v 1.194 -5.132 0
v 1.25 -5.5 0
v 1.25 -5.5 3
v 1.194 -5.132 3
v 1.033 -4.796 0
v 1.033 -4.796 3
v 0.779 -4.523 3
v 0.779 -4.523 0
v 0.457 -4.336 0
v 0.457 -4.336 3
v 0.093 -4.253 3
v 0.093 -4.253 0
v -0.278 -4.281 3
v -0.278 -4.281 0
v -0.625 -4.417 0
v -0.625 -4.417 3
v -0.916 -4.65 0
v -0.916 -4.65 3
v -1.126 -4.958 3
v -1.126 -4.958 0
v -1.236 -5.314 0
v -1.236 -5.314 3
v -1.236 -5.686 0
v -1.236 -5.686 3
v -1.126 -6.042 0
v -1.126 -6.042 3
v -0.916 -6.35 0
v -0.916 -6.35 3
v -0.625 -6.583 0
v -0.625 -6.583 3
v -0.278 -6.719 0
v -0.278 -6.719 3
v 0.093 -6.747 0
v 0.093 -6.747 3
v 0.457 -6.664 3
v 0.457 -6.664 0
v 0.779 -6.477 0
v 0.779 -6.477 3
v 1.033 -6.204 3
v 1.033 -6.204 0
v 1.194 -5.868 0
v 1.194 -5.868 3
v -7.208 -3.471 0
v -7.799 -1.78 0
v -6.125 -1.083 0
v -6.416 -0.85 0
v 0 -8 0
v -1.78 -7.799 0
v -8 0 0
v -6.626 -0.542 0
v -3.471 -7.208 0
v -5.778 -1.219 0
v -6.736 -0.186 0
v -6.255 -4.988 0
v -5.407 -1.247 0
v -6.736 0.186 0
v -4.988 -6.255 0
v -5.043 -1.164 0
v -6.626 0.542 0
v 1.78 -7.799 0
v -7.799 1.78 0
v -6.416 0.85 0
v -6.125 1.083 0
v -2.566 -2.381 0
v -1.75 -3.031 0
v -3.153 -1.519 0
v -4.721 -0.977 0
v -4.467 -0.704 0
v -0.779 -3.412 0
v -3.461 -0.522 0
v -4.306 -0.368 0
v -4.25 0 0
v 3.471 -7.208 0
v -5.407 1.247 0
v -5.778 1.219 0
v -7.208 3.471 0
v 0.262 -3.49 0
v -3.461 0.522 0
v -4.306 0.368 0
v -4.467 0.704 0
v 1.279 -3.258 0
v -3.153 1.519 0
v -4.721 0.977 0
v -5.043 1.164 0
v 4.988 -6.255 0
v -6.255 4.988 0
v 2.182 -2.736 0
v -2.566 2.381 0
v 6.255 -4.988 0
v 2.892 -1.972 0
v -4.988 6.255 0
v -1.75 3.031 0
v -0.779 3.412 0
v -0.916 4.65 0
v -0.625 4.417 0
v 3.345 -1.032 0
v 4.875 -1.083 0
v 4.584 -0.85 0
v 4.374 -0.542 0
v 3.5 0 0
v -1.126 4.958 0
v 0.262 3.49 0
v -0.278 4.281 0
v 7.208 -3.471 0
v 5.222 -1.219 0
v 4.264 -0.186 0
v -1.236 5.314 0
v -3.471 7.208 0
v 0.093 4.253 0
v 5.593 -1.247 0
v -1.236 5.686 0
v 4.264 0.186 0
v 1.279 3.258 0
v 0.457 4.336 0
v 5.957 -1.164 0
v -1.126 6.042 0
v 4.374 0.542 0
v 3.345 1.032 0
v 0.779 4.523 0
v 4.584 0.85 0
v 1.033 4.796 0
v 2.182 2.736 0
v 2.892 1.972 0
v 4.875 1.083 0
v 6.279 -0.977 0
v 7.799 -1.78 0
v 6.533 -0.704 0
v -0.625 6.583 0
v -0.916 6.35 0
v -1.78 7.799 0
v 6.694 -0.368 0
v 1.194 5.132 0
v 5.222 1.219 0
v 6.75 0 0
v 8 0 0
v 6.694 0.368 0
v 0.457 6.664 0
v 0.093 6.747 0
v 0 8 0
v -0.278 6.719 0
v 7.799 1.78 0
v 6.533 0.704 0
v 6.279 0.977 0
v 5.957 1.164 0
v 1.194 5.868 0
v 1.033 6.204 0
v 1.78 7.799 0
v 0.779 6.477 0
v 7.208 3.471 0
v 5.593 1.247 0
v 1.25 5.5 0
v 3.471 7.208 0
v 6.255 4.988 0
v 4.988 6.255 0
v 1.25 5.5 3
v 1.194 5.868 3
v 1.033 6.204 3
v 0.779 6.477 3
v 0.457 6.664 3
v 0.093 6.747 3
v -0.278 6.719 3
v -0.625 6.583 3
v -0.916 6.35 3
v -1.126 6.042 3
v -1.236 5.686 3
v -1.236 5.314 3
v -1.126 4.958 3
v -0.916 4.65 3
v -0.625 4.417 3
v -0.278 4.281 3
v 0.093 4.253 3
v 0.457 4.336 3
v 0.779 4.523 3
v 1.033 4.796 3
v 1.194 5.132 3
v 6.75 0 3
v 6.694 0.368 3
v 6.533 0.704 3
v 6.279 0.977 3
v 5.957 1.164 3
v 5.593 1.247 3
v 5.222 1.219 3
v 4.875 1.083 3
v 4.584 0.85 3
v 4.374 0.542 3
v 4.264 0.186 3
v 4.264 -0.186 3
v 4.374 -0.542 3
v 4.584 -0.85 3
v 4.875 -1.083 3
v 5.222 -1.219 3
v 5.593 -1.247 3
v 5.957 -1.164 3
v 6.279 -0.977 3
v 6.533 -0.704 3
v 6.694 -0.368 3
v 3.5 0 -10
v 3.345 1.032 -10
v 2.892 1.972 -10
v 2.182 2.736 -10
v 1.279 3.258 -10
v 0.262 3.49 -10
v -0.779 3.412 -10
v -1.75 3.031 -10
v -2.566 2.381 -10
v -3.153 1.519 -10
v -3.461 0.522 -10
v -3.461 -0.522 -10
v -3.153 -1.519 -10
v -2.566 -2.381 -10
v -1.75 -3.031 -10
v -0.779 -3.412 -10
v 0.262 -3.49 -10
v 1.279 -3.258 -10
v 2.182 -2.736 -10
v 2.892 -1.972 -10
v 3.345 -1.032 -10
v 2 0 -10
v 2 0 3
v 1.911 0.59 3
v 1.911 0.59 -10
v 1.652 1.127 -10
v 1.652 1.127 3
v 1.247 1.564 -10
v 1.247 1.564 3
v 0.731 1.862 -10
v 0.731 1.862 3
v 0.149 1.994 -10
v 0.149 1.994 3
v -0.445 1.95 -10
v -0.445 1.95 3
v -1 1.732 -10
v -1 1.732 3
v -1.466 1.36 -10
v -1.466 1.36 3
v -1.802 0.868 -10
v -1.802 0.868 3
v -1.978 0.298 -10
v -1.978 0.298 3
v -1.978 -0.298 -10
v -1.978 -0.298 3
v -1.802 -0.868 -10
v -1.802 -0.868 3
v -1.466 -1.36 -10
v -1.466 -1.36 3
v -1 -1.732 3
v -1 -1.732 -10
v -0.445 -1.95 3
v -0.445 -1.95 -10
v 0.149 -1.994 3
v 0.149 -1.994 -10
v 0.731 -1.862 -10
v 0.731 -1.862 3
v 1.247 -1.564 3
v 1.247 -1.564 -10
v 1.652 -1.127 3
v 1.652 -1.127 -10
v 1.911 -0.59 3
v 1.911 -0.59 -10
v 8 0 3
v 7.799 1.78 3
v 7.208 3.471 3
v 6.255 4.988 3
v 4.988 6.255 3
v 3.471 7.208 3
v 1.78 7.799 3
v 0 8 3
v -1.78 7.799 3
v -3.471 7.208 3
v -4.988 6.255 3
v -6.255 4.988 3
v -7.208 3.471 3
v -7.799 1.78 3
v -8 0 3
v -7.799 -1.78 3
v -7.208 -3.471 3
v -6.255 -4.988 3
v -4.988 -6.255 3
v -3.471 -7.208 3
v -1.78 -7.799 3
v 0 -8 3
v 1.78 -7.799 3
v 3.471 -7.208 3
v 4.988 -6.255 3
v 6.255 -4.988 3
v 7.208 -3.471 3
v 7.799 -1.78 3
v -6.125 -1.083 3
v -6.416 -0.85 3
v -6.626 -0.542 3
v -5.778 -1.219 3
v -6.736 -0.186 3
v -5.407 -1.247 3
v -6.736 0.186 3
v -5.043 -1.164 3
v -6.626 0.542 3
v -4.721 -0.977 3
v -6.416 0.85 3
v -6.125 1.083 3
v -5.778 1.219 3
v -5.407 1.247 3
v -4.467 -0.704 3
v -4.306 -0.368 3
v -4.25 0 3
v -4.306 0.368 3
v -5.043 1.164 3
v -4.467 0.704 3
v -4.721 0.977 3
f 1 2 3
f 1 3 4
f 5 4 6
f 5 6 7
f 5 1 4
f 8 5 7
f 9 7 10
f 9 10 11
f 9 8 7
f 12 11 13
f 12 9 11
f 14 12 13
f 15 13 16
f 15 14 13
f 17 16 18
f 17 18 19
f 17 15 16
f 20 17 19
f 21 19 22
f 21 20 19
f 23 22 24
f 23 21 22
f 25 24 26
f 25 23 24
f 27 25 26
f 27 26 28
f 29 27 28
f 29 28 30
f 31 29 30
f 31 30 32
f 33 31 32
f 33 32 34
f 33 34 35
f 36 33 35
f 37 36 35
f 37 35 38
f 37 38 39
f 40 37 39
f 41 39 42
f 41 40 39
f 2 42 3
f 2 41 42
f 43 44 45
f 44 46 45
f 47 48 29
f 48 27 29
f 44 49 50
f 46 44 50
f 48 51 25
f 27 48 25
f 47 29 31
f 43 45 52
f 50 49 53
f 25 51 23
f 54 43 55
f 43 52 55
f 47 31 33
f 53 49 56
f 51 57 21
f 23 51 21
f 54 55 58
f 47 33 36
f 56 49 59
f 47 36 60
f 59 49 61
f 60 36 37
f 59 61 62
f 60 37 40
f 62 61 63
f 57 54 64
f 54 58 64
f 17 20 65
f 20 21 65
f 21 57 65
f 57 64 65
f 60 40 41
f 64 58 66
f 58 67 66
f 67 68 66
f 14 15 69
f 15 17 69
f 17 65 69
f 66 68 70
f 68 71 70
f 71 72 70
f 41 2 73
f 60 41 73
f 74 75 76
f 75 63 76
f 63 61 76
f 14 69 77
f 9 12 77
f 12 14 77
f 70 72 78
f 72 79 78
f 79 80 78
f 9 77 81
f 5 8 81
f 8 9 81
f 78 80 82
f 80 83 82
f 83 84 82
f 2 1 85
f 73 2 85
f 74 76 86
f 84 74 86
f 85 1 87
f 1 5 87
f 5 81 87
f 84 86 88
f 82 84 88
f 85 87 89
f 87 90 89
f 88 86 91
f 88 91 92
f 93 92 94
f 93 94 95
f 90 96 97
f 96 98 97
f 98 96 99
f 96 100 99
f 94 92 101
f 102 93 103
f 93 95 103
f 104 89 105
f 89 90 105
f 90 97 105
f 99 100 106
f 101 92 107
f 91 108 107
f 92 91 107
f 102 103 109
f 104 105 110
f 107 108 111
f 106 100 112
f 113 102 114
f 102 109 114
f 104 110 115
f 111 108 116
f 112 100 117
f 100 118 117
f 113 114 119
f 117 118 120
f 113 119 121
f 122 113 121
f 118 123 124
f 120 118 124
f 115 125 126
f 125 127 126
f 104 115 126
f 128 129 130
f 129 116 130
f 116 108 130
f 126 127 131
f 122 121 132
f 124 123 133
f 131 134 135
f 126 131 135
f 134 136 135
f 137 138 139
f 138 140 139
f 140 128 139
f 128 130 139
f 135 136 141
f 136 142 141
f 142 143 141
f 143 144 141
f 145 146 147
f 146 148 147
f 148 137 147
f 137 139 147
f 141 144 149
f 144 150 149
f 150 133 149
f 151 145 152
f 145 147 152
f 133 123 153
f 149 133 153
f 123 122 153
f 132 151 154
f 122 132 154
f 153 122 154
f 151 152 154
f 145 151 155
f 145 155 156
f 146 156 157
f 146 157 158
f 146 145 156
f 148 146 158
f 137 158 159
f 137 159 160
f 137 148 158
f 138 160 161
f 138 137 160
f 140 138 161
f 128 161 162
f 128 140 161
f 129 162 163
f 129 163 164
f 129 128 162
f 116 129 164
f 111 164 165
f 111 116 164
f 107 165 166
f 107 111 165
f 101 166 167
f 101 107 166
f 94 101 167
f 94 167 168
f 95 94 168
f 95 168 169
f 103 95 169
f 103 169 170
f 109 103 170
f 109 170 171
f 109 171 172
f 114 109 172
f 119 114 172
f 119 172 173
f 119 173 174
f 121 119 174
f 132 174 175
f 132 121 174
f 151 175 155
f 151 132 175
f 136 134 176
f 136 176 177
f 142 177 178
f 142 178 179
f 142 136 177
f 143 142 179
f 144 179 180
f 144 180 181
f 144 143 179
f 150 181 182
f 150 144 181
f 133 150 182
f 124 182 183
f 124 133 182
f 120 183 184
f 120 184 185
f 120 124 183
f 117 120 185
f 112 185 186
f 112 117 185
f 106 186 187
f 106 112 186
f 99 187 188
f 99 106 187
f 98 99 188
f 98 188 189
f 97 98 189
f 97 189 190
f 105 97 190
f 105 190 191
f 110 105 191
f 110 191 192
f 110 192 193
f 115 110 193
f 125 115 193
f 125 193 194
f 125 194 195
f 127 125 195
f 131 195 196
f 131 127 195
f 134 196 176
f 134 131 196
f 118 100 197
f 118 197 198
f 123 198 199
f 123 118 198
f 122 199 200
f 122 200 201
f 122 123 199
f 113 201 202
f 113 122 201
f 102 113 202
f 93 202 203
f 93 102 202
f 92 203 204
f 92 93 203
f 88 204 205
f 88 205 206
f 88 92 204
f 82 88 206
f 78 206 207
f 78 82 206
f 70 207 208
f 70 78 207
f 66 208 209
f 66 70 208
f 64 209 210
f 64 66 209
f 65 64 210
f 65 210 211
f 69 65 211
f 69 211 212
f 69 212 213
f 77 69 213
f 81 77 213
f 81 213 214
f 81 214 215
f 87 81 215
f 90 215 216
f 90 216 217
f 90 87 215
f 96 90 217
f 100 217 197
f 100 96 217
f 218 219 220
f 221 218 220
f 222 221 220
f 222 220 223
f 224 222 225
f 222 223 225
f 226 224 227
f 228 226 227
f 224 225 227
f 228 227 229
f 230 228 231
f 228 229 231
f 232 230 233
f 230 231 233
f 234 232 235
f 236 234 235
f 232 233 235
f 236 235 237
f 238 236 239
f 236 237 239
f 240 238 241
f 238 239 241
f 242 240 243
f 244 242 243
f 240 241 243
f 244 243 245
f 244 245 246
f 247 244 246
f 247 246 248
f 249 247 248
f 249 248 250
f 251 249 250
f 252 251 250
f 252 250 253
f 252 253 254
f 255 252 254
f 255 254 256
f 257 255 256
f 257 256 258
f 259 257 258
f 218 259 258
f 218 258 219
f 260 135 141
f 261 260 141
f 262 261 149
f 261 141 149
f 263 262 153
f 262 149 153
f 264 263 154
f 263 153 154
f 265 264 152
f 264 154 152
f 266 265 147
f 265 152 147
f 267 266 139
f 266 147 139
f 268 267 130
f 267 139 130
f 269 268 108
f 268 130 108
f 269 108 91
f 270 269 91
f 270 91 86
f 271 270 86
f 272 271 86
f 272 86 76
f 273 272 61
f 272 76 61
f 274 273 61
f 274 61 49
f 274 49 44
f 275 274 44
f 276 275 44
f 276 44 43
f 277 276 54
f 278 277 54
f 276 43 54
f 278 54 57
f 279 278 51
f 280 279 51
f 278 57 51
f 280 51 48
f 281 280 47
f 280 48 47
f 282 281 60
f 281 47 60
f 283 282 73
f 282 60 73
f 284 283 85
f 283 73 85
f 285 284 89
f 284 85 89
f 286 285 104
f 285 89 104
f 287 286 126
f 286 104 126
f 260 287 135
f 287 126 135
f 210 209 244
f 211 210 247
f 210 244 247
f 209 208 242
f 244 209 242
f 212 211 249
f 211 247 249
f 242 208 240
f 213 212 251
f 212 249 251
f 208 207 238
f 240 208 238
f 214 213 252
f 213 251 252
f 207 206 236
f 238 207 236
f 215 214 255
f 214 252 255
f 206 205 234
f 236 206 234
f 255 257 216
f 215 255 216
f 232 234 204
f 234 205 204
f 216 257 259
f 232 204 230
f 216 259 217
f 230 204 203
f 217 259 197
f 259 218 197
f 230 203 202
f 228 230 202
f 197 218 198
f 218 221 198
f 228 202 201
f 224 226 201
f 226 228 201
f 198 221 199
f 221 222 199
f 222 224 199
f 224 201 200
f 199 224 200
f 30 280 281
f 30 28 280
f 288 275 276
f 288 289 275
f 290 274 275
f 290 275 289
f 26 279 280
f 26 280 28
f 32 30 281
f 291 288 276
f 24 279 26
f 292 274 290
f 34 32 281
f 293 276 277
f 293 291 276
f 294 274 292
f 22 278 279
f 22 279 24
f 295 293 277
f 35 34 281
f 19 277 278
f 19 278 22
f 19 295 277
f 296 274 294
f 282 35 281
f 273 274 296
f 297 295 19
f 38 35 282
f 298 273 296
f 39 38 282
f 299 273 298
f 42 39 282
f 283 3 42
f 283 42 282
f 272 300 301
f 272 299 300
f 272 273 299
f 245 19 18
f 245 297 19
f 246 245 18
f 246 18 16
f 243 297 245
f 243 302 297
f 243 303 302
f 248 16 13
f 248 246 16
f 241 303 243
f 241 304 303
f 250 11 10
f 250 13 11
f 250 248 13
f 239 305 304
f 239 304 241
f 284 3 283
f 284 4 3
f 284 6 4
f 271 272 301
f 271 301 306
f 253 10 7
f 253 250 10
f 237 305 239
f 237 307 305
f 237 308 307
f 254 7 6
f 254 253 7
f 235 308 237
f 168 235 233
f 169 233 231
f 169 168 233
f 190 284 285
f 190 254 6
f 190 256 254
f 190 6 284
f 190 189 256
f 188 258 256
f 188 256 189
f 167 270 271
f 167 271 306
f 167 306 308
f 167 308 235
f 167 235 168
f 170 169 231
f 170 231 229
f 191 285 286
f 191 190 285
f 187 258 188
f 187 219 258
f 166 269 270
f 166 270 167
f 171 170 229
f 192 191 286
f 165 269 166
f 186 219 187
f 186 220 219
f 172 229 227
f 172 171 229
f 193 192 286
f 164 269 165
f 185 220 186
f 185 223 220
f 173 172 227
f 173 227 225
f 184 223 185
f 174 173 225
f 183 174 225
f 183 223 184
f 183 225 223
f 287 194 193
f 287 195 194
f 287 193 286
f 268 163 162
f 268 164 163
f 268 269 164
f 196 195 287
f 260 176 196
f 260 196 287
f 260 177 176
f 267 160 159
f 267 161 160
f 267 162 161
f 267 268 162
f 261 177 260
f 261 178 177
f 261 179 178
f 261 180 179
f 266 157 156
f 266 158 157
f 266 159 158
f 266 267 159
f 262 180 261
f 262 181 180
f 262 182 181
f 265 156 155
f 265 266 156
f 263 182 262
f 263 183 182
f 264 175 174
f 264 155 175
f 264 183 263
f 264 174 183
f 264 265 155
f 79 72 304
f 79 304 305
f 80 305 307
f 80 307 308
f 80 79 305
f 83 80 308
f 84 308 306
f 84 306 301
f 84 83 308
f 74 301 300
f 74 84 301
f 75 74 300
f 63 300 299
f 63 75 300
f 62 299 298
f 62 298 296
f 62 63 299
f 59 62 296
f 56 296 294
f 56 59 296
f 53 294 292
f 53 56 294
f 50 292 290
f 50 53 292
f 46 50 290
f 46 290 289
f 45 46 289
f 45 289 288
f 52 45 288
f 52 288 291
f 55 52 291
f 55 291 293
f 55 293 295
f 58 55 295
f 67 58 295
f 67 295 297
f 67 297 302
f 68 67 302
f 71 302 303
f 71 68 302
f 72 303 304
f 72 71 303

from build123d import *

# Parameters (mm, degrees)
SKETCH1_R           = 8
SKETCH1_R_2         = 1.25
BOSS_EXTRUDE1_DEPTH = 3
SKETCH2_R           = 3.5
BOSS_EXTRUDE2_DEPTH = 10
SKETCH3_R           = 2
CUT_EXTRUDE1_DEPTH  = 18.23368794


with BuildPart() as part:
    # Sketch1 → Boss-Extrude1 (new body)
    with BuildSketch(Plane.XY):
        Circle(SKETCH1_R)
        with Locations((0, 5.5)):
            Circle(SKETCH1_R_2, mode=Mode.SUBTRACT)
        with Locations((5.5, 0)):
            Circle(SKETCH1_R_2, mode=Mode.SUBTRACT)
        with Locations((0, -5.5)):
            Circle(SKETCH1_R_2, mode=Mode.SUBTRACT)
        with Locations((-5.5, 0)):
            Circle(SKETCH1_R_2, mode=Mode.SUBTRACT)
    extrude(amount=BOSS_EXTRUDE1_DEPTH)

    # Sketch2 → Boss-Extrude2 (add)
    with BuildSketch(Plane.XY):
        Circle(SKETCH2_R)
    extrude(amount=-BOSS_EXTRUDE2_DEPTH)

    # Sketch3 → Cut-Extrude1 (cut, through all)
    with BuildSketch(Plane.XY.offset(3)):
        Circle(SKETCH3_R)
    extrude(amount=-CUT_EXTRUDE1_DEPTH, mode=Mode.SUBTRACT)


solid = part.part
